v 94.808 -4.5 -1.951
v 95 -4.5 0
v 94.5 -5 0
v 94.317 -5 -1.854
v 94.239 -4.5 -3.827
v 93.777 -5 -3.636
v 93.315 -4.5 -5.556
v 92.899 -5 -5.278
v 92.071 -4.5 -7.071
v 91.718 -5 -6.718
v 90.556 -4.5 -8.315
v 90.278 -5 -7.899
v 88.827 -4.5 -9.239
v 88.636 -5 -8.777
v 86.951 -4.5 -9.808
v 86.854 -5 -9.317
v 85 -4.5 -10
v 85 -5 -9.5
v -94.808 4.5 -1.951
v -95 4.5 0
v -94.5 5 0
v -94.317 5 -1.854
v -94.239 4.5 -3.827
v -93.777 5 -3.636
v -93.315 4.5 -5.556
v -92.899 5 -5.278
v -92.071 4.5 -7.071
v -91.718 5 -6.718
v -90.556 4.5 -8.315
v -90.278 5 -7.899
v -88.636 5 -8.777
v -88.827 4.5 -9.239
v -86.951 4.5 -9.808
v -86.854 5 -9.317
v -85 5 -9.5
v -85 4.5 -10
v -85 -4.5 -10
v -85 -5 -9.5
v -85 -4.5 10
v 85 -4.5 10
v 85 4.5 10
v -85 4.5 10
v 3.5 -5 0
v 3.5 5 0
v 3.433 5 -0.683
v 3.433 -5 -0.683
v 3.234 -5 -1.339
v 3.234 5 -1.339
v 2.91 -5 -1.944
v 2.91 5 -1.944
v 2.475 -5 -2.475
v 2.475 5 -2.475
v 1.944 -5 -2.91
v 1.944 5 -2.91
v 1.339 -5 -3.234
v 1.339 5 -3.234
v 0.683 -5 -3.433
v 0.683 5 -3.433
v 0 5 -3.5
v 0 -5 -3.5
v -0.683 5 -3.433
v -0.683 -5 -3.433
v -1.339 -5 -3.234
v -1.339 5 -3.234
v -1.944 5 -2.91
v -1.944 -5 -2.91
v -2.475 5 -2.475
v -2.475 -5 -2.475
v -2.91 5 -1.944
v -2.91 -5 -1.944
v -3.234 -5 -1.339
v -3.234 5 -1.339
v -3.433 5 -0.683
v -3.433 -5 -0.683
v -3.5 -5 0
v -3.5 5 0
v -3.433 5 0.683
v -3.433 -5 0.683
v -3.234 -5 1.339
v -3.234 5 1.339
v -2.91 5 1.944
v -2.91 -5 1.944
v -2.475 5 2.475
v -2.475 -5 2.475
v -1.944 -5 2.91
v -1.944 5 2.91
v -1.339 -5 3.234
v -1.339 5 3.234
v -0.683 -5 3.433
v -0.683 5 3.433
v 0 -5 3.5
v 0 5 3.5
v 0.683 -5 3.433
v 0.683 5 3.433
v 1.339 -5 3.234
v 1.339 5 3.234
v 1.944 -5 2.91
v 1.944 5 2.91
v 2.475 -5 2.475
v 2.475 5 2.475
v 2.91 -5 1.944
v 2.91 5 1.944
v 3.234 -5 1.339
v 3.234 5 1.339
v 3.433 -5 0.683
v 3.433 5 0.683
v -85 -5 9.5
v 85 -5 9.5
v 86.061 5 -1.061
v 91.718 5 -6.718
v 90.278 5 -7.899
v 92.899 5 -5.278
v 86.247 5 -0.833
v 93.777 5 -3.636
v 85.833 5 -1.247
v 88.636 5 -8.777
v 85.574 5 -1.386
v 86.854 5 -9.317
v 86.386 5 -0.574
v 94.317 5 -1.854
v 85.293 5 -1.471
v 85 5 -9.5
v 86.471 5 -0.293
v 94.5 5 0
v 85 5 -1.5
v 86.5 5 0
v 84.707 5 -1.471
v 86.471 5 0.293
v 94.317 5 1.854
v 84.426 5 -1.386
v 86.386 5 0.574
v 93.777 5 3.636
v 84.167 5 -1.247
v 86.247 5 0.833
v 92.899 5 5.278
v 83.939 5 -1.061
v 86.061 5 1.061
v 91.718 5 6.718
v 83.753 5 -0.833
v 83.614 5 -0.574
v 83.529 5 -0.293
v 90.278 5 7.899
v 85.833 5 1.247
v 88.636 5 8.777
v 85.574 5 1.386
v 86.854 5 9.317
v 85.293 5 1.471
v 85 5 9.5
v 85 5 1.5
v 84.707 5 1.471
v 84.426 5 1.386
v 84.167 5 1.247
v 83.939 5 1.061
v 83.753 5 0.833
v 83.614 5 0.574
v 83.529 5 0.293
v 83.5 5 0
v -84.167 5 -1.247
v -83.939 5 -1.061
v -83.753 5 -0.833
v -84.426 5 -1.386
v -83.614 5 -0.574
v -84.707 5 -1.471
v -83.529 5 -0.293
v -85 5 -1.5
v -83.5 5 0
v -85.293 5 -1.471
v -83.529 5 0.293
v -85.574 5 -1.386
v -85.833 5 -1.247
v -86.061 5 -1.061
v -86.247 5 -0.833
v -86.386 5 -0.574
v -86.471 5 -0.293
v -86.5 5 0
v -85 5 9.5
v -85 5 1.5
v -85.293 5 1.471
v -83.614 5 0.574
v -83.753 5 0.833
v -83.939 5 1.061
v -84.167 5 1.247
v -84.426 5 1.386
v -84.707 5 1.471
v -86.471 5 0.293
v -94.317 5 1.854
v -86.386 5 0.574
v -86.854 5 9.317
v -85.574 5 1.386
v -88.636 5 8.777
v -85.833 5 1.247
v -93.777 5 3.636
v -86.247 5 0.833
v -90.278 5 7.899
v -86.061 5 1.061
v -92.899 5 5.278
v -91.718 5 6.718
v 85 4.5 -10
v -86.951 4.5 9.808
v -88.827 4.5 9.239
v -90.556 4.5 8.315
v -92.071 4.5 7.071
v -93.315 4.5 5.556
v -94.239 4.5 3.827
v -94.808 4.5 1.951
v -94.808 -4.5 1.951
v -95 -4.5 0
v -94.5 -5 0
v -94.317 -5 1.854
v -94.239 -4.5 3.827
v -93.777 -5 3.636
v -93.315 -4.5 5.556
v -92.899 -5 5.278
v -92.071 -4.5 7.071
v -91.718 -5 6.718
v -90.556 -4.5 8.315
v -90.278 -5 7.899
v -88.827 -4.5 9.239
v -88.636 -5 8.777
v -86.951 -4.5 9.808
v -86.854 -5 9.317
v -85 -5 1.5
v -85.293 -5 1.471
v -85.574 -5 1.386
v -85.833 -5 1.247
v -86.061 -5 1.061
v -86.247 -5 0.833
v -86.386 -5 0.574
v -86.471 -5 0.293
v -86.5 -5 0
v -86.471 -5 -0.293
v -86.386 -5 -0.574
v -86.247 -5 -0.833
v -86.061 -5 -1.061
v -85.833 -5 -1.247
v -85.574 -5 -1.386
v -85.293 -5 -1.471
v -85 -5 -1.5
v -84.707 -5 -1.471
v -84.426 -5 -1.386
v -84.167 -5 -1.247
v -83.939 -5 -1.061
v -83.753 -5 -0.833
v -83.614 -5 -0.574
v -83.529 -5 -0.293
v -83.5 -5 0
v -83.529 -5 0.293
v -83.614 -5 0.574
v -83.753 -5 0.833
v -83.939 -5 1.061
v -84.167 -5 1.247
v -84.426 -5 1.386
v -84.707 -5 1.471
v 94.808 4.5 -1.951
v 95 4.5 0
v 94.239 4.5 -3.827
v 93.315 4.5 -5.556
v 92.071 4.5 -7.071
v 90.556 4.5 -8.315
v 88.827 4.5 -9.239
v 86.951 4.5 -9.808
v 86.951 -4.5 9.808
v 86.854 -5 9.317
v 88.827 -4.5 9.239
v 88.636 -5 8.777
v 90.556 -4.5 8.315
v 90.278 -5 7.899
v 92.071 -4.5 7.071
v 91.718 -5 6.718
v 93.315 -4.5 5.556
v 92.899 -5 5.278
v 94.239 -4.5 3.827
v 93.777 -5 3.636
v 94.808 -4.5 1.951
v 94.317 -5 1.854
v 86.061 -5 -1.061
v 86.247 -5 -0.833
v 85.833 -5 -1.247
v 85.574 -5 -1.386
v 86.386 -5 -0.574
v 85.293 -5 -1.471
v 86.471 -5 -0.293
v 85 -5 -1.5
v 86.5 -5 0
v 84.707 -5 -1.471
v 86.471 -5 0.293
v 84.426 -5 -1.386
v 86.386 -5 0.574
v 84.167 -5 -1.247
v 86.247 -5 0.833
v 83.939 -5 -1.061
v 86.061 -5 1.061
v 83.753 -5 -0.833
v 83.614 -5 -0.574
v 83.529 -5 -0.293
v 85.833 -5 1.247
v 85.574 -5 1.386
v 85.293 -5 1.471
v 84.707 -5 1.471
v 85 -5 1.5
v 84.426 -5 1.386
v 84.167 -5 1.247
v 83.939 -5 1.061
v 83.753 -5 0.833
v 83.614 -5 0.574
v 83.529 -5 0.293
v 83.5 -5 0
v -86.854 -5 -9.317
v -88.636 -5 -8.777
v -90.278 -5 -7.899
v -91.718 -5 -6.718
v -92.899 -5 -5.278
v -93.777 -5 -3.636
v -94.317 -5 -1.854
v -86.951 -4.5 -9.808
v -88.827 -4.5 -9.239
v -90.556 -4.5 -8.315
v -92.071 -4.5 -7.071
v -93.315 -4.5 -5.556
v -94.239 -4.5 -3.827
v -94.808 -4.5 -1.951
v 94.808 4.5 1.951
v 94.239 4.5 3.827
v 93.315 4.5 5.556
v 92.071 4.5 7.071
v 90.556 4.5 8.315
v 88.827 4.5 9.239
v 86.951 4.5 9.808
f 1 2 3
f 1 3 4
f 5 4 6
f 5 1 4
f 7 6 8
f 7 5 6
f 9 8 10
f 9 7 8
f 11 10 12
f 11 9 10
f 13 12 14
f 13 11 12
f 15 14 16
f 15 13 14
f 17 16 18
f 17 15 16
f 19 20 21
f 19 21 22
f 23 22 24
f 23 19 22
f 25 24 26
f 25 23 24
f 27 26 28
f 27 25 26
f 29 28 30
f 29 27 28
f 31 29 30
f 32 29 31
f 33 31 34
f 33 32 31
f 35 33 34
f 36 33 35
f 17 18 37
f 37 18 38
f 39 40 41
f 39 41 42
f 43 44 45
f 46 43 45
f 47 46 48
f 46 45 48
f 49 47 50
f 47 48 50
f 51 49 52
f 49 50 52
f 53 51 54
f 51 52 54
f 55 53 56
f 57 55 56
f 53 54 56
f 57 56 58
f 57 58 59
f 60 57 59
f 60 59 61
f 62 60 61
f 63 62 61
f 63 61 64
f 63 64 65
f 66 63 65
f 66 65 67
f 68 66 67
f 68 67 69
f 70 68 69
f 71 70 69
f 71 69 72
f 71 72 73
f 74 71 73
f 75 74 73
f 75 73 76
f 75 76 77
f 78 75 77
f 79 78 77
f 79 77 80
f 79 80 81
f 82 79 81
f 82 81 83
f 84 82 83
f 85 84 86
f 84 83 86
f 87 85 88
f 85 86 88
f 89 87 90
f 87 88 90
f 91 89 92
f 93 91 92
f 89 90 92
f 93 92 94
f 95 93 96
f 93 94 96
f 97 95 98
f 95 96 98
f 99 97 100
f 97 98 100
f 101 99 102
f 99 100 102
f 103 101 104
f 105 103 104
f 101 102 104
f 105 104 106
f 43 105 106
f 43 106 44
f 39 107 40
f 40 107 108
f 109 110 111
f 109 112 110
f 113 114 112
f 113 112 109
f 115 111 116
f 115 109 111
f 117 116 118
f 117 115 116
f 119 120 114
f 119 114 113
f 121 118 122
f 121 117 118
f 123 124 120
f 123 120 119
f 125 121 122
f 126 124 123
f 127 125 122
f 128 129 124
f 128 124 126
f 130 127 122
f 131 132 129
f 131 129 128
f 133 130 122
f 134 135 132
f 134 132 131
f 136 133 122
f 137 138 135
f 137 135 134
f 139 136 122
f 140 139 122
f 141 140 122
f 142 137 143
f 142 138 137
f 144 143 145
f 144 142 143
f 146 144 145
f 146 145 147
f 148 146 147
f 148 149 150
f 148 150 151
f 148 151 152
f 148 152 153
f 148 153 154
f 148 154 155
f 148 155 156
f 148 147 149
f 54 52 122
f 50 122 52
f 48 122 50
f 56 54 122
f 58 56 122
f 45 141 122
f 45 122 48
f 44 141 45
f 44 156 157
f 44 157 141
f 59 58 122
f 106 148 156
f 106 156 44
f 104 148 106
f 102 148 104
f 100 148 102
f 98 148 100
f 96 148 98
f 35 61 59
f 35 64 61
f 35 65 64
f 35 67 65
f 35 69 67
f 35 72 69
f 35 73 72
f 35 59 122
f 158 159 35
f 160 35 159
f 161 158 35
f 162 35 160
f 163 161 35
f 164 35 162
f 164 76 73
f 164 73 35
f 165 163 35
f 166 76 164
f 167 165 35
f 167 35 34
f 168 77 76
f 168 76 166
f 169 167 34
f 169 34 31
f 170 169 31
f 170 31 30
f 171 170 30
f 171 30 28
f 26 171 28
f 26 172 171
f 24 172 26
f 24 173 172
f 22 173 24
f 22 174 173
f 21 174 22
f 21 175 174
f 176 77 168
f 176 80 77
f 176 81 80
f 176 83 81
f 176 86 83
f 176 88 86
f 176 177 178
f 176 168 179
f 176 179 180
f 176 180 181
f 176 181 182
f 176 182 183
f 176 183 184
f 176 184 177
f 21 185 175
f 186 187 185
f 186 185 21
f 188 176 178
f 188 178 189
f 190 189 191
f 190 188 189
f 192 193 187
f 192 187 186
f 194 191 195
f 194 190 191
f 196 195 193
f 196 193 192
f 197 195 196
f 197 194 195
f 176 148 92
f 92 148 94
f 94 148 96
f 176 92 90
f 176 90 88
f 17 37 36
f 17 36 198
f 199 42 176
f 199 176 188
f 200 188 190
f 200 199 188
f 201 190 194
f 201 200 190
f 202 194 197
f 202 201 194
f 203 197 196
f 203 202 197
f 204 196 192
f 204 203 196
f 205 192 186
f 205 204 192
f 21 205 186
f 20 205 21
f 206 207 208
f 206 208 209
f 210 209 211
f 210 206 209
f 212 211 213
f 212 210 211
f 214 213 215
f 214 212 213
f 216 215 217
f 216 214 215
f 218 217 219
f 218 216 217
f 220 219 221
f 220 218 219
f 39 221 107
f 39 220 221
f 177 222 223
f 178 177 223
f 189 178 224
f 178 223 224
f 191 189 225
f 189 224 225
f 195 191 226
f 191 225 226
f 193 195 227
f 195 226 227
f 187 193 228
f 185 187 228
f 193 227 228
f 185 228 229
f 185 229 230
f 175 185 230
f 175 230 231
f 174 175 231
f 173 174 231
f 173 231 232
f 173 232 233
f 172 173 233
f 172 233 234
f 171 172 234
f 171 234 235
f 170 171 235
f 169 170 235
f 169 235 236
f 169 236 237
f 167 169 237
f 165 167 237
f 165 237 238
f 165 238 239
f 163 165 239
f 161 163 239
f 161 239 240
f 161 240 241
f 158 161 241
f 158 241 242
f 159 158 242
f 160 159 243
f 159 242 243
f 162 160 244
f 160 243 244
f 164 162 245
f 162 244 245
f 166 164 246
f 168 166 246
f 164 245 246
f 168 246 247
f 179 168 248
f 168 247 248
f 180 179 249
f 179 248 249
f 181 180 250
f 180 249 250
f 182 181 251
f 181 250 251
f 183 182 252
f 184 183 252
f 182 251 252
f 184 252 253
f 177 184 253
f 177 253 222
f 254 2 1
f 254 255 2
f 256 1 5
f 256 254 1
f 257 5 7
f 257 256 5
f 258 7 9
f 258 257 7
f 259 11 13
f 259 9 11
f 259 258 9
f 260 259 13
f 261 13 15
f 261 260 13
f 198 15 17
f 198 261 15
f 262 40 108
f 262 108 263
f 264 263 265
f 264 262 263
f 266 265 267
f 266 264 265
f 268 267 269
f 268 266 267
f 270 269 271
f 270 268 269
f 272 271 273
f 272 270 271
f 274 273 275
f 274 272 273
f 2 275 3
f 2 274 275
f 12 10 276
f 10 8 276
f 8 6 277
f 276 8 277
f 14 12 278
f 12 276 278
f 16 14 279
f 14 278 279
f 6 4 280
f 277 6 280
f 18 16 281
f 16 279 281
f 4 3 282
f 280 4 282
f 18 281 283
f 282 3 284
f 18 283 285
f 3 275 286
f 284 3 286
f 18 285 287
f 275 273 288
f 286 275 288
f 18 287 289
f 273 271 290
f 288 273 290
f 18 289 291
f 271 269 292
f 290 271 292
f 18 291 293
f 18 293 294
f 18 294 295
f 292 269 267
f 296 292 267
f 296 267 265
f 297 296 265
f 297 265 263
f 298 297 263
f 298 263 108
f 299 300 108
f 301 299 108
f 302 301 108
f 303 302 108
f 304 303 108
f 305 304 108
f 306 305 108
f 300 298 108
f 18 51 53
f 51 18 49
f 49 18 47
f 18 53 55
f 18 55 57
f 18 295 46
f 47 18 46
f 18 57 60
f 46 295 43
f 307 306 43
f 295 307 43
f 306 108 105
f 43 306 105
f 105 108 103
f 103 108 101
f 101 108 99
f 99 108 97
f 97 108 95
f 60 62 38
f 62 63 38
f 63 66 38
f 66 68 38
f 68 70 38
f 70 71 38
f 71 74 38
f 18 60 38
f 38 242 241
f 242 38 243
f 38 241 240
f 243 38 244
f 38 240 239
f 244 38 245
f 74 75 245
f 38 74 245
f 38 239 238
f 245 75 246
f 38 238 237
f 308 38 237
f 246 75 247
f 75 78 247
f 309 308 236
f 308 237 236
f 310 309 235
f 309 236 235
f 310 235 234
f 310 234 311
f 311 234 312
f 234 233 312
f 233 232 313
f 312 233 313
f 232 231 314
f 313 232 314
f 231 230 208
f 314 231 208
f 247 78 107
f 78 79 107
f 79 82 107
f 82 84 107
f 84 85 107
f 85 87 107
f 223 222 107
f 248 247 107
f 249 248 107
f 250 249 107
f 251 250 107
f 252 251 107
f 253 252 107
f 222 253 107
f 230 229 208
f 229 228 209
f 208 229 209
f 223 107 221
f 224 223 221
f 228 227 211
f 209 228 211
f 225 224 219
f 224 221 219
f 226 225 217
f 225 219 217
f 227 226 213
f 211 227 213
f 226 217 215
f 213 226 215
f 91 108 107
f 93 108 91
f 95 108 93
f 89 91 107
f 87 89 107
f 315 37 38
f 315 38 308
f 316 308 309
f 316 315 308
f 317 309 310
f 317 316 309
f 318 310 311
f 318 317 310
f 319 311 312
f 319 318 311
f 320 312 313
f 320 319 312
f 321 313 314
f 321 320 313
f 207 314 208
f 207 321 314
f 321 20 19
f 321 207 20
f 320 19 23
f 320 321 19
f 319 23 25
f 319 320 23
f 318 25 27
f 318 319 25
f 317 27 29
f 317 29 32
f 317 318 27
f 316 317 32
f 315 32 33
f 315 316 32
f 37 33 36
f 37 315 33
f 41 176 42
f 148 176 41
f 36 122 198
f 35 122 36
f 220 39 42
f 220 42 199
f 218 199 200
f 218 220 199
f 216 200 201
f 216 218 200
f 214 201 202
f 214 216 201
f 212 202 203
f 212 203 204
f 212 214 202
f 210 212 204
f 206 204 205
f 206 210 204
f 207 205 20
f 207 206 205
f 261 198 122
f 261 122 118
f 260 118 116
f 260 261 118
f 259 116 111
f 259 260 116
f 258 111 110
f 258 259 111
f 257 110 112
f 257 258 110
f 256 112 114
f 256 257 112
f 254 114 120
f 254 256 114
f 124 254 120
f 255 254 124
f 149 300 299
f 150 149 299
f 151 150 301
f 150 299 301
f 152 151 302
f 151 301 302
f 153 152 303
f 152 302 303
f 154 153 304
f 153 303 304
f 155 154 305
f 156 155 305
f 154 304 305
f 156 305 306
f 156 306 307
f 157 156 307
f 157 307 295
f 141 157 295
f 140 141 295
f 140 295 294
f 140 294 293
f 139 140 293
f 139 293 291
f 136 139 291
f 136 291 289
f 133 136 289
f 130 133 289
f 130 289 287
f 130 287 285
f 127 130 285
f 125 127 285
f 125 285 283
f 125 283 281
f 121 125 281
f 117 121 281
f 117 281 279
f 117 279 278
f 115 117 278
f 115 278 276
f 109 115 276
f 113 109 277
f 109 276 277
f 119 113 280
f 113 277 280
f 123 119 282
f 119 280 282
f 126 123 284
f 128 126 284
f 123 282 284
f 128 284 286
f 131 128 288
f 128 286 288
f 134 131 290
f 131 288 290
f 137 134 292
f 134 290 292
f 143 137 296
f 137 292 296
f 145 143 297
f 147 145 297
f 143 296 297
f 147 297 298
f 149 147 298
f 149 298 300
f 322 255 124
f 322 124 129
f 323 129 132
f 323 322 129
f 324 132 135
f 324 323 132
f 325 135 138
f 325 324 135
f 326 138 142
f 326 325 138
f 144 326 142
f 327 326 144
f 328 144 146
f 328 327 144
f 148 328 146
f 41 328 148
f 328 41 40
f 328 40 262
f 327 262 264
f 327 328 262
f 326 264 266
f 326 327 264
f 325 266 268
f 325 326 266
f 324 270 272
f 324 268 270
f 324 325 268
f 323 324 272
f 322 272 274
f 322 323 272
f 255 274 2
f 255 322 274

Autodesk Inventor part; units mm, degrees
ref_plane "YZ Plane" through (0, 0, 0) normal (1, 0, 0) x (0, 1, 0)
ref_plane "XZ Plane" through (0, 0, 0) normal (0, 1, 0) x (-1, 0, 0)
ref_plane "XY Plane" through (0, 0, 0) normal (0, 0, 1) x (1, 0, 0)
sketch "Sketch1" plane through (0, 0, 0) normal (0, 1, 0) x (-1, 0, 0)
  line L0 (-95, 10) -> (95, 10)
  line L1 (95, 10) -> (95, -10)
  line L2 (95, -10) -> (-95, -10)
  line L3 (-95, -10) -> (-95, 10)
  line L4 (-95, 10) -> (95, -10) construction
  line L5 (95, 10) -> (-95, -10) construction
  point P0 (0, 0)
  dimension "Length" = 190
  dimension "Width" = 20
extrude "Extrusion1" add sketch "Sketch1" along normal mid plane 10
sketch "Sketch2" plane through (0, 5, 0) normal (0, 1, 0) x (1, 0, 0)
  circle A0 centre (0, 0) radius 3.5
  dimension "d4" = 7
extrude "Extrusion2" cut sketch "Sketch2" against normal up to surface (10 mm away)
sketch "Sketch3" plane through (0, 5, 0) normal (0, 1, 0) x (1, 0, 0)
  circle A0 centre (0, 0) radius 3.5 projected
  point P0 (-15, 0)
  point P1 (15, 0)
  dimension "d7" = 30
  dimension "d8" = 15
hole "Hole1" [suppressed]
sketch "Sketch4" plane through (0, 5, 0) normal (0, 1, 0) x (1, 0, 0)
  point P0 (0, 0)
  point P1 (-85, 0)
  point P2 (85, 0)
  dimension "d16" = 170
  dimension "d17" = 85
hole "Hole2" at (-85, 5, 0) at (85, 5, 0) direction (0, -1, 0) diameter 3 end through all
fillet "Fillet1" radius 10 4 edges at (95, 0, 10) (95, 0, -10) (-95, 0, 10) (-95, 0, -10)
chamfer "Chamfer1" distance 0.5 angle 45 8 edges at (0, 5, 10) (92.0712, 5, 7.0712) (0, 5, -10) (-92.0712, 5, 7.0712) (0, -5, 10) (-92.0712, -5, 7.0712) (0, -5, -10) (92.0712, -5, 7.0712)
equation "\"d8\" = 0.5 * d7"
equation "\"d17\" = 0.5 * d16"
properties part number "Lower Arm Brass Plate - 2" material "Brass, Soft Yellow"
